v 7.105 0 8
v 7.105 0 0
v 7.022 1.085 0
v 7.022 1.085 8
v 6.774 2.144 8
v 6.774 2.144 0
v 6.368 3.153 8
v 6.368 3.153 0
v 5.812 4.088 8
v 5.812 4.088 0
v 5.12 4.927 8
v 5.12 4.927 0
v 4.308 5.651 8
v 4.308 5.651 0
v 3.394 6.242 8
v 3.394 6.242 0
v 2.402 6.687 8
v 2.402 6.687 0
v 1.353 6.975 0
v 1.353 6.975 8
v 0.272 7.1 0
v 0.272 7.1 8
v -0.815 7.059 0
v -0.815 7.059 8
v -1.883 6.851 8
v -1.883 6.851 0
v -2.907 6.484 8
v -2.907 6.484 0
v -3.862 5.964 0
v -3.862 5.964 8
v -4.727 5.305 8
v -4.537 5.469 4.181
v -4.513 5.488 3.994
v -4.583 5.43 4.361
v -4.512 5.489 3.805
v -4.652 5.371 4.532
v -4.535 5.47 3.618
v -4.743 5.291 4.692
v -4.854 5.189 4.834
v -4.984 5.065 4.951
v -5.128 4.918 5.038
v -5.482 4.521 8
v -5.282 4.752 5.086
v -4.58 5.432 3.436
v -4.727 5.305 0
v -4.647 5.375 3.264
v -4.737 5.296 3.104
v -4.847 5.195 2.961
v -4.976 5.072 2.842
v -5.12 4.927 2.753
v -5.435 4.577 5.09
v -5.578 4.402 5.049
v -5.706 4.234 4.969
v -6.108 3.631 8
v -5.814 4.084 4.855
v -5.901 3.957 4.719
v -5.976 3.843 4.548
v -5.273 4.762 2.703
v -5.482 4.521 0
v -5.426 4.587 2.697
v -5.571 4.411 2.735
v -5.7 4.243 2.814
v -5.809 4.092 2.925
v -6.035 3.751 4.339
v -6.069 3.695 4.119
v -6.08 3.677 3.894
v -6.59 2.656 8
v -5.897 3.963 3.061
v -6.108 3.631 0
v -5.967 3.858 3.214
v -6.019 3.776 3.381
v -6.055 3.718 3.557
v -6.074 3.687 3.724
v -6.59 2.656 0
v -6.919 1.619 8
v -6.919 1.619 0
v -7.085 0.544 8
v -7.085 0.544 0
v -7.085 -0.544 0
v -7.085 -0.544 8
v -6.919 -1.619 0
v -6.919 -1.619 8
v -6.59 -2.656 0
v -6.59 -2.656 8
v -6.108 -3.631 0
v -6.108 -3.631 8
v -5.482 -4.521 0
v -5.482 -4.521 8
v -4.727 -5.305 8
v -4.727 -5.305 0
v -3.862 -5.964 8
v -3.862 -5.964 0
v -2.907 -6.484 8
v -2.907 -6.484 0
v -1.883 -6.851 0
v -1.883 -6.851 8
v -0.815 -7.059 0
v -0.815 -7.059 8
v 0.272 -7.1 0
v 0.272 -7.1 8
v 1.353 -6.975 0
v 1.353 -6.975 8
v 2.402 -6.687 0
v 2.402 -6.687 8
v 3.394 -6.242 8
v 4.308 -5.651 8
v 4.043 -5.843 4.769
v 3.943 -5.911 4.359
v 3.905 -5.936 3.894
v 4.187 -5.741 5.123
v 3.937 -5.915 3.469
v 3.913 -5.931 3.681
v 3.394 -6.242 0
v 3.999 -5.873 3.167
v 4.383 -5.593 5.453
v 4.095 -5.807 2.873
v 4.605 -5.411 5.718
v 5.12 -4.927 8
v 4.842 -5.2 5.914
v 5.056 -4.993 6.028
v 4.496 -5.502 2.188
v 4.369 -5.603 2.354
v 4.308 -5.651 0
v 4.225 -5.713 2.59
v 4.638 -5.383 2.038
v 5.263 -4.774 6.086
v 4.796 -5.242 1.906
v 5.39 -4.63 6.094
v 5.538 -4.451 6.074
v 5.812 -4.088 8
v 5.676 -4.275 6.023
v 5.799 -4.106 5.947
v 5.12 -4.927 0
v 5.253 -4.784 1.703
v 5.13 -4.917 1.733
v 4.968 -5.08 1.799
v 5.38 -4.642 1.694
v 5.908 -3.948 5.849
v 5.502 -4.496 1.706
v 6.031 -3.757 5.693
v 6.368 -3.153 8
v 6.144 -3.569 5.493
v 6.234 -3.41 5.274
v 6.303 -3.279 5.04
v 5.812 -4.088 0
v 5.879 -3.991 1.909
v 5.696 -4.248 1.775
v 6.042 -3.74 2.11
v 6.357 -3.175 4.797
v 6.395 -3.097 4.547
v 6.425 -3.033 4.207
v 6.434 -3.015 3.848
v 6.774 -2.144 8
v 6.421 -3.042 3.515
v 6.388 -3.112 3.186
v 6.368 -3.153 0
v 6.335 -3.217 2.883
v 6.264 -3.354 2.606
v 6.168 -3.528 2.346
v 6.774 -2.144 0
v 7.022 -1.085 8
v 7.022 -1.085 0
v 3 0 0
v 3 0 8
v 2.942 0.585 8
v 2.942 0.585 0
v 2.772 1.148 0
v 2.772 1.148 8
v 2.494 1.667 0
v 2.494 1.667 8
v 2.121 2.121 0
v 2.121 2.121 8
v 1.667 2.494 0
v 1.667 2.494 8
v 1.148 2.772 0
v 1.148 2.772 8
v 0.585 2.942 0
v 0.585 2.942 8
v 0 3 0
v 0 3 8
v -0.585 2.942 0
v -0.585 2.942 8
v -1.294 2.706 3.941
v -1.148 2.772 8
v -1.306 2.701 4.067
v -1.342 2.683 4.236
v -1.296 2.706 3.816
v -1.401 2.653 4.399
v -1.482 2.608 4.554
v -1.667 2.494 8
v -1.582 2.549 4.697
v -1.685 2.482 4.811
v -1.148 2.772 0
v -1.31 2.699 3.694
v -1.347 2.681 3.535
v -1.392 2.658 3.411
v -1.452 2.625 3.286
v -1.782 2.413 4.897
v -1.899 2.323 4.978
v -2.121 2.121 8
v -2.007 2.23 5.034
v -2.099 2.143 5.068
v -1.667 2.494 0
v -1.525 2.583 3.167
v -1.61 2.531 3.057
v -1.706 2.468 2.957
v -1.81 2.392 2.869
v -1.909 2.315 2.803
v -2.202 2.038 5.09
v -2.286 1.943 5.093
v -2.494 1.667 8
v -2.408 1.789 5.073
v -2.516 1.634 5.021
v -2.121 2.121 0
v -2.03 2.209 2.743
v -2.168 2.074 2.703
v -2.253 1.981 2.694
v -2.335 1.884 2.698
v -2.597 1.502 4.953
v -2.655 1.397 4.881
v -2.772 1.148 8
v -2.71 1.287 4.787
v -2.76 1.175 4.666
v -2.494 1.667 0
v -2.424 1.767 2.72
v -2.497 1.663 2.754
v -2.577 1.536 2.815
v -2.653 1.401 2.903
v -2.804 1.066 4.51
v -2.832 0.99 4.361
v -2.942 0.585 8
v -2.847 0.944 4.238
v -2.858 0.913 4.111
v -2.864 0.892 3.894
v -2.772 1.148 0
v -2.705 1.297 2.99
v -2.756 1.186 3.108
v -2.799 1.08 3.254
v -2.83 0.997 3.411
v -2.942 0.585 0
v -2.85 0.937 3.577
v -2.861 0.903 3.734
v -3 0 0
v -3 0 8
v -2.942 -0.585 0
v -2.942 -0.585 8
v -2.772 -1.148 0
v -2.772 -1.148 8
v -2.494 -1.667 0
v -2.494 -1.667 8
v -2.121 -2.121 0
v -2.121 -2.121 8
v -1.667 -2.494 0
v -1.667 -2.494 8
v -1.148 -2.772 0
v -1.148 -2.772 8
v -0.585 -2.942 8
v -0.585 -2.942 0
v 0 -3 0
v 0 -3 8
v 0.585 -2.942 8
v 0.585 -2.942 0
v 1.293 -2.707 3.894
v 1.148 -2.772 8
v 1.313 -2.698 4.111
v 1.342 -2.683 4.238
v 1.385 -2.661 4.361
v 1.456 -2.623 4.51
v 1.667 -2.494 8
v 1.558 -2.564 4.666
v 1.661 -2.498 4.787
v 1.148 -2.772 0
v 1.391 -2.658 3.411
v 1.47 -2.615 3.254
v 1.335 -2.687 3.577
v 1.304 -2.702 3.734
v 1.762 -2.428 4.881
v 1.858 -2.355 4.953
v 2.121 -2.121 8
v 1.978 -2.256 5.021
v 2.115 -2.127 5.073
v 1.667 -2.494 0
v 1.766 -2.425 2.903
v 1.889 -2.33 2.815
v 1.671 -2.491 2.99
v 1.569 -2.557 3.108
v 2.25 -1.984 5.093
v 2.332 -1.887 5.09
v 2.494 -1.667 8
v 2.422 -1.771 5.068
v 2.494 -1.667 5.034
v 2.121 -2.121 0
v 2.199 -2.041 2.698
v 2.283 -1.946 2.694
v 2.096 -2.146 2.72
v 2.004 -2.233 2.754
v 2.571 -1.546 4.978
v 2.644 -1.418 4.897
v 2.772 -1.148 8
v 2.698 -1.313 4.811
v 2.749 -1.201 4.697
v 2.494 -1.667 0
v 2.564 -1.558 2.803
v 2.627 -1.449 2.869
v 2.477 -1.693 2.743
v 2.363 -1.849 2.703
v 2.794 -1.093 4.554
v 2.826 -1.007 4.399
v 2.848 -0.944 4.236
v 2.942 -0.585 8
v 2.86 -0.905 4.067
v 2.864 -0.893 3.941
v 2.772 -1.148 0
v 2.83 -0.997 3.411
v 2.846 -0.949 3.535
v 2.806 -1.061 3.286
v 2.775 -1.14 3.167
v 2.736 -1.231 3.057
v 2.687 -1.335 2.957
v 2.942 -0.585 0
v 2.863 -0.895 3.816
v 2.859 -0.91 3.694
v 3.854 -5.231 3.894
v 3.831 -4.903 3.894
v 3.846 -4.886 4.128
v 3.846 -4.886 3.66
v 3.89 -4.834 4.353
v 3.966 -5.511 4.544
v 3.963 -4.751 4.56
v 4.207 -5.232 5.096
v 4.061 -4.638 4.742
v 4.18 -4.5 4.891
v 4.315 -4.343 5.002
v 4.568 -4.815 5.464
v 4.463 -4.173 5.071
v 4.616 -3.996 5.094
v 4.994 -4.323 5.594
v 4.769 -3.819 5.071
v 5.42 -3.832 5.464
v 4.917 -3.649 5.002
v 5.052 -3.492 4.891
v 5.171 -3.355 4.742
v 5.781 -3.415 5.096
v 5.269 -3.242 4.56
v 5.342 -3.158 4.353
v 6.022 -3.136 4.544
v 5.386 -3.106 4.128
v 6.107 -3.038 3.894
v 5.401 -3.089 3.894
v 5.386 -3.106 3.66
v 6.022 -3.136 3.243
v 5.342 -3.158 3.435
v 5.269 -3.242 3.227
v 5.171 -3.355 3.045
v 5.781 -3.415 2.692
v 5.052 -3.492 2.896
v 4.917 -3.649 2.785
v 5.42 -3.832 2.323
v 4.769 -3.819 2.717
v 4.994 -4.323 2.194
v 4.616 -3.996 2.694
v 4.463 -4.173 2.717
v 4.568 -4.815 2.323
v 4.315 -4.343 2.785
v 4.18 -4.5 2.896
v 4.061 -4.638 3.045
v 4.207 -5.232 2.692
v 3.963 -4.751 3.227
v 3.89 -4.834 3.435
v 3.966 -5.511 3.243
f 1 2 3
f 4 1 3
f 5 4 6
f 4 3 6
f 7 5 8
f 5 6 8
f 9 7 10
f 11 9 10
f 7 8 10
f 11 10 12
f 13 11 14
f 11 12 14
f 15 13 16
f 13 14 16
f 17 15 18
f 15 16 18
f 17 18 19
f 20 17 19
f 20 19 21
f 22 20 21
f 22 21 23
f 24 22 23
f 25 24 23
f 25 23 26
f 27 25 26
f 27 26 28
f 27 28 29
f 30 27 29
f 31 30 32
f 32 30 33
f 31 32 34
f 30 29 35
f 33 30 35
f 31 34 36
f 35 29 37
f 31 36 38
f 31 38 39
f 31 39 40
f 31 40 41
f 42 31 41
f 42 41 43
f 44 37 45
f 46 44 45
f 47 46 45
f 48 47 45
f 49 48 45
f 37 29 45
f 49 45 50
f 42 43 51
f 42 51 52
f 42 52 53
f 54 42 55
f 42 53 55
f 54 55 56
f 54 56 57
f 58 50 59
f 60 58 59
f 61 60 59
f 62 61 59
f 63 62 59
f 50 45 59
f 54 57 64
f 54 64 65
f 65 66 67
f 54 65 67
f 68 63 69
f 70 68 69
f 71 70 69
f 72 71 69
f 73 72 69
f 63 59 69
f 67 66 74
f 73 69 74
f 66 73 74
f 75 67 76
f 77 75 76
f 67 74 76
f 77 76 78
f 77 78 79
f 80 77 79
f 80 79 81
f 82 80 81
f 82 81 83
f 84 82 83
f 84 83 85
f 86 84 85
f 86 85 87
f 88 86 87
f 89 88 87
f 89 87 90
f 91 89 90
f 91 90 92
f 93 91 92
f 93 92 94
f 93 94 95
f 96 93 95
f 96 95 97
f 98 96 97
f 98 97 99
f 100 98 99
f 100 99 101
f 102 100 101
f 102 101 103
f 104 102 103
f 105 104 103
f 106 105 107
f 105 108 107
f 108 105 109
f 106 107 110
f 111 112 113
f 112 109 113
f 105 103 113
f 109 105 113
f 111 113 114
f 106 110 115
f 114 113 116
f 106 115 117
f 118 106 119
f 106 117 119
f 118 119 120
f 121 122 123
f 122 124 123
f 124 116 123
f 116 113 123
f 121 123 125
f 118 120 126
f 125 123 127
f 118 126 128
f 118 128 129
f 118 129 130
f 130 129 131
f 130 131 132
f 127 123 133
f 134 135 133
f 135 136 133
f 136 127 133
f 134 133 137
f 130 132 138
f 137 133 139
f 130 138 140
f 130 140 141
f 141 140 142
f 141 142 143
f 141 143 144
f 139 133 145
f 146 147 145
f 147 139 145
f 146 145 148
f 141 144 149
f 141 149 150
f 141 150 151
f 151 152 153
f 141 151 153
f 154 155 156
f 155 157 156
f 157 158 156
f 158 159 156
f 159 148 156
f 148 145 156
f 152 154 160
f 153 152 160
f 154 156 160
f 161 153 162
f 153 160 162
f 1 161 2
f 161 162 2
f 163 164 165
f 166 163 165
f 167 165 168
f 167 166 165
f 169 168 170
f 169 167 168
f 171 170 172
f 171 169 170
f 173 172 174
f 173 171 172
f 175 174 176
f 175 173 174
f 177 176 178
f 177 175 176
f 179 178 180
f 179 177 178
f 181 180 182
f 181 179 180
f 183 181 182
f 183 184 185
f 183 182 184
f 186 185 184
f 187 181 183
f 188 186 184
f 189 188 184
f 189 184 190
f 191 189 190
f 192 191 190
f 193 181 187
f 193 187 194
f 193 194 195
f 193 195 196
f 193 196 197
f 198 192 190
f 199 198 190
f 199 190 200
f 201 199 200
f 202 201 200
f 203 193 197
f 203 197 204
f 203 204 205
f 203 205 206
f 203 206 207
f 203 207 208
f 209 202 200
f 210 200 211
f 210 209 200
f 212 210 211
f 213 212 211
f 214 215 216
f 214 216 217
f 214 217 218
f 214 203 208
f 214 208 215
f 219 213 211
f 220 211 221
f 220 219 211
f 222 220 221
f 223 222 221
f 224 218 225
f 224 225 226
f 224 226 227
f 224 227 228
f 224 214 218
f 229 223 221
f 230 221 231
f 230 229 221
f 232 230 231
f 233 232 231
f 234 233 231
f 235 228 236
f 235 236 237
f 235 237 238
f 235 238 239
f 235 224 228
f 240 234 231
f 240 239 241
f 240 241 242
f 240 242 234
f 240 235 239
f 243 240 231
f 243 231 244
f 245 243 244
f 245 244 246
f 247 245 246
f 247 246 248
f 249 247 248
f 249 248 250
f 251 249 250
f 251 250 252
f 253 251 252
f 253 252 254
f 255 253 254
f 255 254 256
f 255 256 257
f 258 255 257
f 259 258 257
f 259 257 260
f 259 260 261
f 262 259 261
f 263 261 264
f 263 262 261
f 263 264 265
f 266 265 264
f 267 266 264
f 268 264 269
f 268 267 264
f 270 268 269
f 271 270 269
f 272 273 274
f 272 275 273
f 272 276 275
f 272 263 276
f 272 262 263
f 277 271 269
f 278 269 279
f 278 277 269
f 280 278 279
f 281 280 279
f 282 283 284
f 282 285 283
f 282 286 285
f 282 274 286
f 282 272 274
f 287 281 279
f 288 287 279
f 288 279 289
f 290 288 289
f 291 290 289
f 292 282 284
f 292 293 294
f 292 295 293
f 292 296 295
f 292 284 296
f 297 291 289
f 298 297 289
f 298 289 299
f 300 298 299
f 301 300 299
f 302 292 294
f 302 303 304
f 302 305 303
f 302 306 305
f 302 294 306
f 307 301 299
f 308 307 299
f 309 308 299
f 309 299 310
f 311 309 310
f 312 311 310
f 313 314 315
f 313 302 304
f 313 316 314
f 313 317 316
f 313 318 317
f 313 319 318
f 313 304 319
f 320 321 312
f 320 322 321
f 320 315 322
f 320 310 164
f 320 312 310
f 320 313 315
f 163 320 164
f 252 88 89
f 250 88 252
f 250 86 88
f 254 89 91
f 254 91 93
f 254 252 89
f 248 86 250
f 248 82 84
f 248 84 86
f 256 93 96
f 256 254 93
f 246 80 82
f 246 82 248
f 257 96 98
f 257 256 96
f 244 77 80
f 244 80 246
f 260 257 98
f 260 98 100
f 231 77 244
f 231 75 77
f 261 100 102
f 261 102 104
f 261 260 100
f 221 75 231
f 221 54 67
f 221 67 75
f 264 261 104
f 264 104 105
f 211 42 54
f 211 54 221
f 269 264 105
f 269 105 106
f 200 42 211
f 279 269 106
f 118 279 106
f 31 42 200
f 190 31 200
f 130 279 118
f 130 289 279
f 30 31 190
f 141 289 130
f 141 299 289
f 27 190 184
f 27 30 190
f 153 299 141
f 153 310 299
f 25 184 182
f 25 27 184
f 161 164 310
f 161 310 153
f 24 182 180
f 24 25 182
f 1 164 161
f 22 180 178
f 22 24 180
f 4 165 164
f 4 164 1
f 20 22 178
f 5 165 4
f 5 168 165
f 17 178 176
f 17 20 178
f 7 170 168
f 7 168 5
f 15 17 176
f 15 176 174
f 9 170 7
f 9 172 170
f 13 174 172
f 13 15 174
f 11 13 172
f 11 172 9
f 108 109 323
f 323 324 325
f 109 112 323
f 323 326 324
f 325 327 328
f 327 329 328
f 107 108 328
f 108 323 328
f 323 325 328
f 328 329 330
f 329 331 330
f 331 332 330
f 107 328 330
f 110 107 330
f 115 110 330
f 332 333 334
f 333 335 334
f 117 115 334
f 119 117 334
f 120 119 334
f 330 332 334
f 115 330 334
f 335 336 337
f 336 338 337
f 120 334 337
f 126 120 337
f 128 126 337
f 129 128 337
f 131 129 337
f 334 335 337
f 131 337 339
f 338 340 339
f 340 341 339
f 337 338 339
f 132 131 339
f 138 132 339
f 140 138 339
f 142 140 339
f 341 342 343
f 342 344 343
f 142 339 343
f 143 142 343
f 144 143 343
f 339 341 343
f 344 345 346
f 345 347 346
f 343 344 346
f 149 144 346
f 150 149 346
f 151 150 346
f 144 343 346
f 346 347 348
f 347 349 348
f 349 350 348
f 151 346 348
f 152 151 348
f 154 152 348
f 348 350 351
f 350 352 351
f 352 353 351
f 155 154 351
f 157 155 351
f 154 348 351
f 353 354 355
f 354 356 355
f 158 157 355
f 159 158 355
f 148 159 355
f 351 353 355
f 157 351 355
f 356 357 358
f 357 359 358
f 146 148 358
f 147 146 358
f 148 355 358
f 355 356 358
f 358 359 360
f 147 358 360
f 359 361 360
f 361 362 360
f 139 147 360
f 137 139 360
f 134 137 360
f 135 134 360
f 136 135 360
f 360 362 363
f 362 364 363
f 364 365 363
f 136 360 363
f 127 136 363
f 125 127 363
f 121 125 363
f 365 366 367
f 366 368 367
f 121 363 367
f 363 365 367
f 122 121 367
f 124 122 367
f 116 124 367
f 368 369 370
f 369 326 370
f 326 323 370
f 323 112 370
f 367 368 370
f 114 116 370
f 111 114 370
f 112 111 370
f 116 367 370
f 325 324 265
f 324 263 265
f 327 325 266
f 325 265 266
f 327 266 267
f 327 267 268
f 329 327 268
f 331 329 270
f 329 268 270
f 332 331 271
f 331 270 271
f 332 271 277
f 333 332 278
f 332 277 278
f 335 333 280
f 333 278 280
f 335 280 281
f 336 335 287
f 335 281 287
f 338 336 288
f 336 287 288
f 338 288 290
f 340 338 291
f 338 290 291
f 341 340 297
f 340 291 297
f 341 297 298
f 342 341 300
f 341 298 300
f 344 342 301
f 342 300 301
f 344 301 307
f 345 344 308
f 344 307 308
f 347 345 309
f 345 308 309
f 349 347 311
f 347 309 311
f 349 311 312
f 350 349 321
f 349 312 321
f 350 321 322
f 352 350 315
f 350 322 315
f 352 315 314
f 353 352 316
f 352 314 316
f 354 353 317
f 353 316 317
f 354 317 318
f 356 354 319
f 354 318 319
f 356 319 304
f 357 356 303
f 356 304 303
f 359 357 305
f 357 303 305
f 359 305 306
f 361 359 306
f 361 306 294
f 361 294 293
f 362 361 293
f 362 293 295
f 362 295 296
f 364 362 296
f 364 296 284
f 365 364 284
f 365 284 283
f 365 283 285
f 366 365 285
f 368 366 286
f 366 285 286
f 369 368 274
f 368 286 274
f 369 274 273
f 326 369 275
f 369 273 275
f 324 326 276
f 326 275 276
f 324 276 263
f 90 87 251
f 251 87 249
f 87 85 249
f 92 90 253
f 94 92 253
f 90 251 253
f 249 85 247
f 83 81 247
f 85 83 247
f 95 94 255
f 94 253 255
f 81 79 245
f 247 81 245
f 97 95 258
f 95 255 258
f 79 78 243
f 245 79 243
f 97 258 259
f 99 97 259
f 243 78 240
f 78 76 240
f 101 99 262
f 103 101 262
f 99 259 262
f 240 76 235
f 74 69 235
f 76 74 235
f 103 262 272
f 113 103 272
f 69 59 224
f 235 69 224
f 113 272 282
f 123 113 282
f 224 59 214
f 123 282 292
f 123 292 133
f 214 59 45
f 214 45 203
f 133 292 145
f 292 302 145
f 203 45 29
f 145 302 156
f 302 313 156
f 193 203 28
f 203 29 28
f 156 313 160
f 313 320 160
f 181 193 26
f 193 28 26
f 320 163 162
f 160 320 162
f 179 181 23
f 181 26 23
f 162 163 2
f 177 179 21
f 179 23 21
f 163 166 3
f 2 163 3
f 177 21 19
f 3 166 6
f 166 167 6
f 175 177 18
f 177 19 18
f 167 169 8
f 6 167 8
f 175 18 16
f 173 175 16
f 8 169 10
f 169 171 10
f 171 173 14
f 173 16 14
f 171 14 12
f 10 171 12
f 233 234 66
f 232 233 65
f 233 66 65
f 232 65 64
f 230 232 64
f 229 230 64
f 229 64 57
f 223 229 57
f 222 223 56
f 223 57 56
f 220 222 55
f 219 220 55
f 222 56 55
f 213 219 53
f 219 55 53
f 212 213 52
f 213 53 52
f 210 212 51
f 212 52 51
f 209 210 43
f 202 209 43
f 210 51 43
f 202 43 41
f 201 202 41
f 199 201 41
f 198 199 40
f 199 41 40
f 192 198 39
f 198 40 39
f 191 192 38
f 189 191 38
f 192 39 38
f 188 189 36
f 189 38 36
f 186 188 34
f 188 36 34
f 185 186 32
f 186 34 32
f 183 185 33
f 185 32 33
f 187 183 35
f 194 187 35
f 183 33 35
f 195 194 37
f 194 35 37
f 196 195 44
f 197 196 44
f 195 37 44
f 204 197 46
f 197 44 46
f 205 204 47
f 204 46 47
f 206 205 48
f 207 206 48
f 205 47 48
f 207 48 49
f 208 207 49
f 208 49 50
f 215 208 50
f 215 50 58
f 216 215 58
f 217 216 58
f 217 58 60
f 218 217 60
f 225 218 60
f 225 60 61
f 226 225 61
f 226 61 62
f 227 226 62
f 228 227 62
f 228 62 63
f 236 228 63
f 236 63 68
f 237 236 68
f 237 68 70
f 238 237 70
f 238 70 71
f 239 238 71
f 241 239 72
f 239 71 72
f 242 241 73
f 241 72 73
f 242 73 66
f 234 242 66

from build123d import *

# Parameters (mm, degrees)
SKETCH1_R                                       = 7.105443578
SKETCH1_R_2                                     = 3
BOSS_EXTRUDE3_DEPTH                             = 8
CSK_FOR_M2_FLAT_HEAD_MACHINE_SCREW2_D           = 2.4
CSK_FOR_M2_FLAT_HEAD_MACHINE_SCREW2_CSINK_D     = 4.4
CSK_FOR_M2_FLAT_HEAD_MACHINE_SCREW2_CSINK_ANGLE = 90


with BuildPart() as part:
    # Sketch1 → Boss-Extrude3 (new body)
    with BuildSketch(Plane.XY):
        Circle(SKETCH1_R)
        Circle(SKETCH1_R_2, mode=Mode.SUBTRACT)
    extrude(amount=BOSS_EXTRUDE3_DEPTH)

    # CSK for M2 Flat Head Machine Screw2 (through all)
    with Locations(Plane(origin=(5.371974404, -4.650722466, 3.893731666), x_dir=(0.654529504622, 0.75603645916, 0), z_dir=(0.75603645916, -0.654529504622, 0))):
        with Locations((0, 0)):
            CounterSinkHole(CSK_FOR_M2_FLAT_HEAD_MACHINE_SCREW2_D / 2, CSK_FOR_M2_FLAT_HEAD_MACHINE_SCREW2_CSINK_D / 2, counter_sink_angle=CSK_FOR_M2_FLAT_HEAD_MACHINE_SCREW2_CSINK_ANGLE)


solid = part.part
